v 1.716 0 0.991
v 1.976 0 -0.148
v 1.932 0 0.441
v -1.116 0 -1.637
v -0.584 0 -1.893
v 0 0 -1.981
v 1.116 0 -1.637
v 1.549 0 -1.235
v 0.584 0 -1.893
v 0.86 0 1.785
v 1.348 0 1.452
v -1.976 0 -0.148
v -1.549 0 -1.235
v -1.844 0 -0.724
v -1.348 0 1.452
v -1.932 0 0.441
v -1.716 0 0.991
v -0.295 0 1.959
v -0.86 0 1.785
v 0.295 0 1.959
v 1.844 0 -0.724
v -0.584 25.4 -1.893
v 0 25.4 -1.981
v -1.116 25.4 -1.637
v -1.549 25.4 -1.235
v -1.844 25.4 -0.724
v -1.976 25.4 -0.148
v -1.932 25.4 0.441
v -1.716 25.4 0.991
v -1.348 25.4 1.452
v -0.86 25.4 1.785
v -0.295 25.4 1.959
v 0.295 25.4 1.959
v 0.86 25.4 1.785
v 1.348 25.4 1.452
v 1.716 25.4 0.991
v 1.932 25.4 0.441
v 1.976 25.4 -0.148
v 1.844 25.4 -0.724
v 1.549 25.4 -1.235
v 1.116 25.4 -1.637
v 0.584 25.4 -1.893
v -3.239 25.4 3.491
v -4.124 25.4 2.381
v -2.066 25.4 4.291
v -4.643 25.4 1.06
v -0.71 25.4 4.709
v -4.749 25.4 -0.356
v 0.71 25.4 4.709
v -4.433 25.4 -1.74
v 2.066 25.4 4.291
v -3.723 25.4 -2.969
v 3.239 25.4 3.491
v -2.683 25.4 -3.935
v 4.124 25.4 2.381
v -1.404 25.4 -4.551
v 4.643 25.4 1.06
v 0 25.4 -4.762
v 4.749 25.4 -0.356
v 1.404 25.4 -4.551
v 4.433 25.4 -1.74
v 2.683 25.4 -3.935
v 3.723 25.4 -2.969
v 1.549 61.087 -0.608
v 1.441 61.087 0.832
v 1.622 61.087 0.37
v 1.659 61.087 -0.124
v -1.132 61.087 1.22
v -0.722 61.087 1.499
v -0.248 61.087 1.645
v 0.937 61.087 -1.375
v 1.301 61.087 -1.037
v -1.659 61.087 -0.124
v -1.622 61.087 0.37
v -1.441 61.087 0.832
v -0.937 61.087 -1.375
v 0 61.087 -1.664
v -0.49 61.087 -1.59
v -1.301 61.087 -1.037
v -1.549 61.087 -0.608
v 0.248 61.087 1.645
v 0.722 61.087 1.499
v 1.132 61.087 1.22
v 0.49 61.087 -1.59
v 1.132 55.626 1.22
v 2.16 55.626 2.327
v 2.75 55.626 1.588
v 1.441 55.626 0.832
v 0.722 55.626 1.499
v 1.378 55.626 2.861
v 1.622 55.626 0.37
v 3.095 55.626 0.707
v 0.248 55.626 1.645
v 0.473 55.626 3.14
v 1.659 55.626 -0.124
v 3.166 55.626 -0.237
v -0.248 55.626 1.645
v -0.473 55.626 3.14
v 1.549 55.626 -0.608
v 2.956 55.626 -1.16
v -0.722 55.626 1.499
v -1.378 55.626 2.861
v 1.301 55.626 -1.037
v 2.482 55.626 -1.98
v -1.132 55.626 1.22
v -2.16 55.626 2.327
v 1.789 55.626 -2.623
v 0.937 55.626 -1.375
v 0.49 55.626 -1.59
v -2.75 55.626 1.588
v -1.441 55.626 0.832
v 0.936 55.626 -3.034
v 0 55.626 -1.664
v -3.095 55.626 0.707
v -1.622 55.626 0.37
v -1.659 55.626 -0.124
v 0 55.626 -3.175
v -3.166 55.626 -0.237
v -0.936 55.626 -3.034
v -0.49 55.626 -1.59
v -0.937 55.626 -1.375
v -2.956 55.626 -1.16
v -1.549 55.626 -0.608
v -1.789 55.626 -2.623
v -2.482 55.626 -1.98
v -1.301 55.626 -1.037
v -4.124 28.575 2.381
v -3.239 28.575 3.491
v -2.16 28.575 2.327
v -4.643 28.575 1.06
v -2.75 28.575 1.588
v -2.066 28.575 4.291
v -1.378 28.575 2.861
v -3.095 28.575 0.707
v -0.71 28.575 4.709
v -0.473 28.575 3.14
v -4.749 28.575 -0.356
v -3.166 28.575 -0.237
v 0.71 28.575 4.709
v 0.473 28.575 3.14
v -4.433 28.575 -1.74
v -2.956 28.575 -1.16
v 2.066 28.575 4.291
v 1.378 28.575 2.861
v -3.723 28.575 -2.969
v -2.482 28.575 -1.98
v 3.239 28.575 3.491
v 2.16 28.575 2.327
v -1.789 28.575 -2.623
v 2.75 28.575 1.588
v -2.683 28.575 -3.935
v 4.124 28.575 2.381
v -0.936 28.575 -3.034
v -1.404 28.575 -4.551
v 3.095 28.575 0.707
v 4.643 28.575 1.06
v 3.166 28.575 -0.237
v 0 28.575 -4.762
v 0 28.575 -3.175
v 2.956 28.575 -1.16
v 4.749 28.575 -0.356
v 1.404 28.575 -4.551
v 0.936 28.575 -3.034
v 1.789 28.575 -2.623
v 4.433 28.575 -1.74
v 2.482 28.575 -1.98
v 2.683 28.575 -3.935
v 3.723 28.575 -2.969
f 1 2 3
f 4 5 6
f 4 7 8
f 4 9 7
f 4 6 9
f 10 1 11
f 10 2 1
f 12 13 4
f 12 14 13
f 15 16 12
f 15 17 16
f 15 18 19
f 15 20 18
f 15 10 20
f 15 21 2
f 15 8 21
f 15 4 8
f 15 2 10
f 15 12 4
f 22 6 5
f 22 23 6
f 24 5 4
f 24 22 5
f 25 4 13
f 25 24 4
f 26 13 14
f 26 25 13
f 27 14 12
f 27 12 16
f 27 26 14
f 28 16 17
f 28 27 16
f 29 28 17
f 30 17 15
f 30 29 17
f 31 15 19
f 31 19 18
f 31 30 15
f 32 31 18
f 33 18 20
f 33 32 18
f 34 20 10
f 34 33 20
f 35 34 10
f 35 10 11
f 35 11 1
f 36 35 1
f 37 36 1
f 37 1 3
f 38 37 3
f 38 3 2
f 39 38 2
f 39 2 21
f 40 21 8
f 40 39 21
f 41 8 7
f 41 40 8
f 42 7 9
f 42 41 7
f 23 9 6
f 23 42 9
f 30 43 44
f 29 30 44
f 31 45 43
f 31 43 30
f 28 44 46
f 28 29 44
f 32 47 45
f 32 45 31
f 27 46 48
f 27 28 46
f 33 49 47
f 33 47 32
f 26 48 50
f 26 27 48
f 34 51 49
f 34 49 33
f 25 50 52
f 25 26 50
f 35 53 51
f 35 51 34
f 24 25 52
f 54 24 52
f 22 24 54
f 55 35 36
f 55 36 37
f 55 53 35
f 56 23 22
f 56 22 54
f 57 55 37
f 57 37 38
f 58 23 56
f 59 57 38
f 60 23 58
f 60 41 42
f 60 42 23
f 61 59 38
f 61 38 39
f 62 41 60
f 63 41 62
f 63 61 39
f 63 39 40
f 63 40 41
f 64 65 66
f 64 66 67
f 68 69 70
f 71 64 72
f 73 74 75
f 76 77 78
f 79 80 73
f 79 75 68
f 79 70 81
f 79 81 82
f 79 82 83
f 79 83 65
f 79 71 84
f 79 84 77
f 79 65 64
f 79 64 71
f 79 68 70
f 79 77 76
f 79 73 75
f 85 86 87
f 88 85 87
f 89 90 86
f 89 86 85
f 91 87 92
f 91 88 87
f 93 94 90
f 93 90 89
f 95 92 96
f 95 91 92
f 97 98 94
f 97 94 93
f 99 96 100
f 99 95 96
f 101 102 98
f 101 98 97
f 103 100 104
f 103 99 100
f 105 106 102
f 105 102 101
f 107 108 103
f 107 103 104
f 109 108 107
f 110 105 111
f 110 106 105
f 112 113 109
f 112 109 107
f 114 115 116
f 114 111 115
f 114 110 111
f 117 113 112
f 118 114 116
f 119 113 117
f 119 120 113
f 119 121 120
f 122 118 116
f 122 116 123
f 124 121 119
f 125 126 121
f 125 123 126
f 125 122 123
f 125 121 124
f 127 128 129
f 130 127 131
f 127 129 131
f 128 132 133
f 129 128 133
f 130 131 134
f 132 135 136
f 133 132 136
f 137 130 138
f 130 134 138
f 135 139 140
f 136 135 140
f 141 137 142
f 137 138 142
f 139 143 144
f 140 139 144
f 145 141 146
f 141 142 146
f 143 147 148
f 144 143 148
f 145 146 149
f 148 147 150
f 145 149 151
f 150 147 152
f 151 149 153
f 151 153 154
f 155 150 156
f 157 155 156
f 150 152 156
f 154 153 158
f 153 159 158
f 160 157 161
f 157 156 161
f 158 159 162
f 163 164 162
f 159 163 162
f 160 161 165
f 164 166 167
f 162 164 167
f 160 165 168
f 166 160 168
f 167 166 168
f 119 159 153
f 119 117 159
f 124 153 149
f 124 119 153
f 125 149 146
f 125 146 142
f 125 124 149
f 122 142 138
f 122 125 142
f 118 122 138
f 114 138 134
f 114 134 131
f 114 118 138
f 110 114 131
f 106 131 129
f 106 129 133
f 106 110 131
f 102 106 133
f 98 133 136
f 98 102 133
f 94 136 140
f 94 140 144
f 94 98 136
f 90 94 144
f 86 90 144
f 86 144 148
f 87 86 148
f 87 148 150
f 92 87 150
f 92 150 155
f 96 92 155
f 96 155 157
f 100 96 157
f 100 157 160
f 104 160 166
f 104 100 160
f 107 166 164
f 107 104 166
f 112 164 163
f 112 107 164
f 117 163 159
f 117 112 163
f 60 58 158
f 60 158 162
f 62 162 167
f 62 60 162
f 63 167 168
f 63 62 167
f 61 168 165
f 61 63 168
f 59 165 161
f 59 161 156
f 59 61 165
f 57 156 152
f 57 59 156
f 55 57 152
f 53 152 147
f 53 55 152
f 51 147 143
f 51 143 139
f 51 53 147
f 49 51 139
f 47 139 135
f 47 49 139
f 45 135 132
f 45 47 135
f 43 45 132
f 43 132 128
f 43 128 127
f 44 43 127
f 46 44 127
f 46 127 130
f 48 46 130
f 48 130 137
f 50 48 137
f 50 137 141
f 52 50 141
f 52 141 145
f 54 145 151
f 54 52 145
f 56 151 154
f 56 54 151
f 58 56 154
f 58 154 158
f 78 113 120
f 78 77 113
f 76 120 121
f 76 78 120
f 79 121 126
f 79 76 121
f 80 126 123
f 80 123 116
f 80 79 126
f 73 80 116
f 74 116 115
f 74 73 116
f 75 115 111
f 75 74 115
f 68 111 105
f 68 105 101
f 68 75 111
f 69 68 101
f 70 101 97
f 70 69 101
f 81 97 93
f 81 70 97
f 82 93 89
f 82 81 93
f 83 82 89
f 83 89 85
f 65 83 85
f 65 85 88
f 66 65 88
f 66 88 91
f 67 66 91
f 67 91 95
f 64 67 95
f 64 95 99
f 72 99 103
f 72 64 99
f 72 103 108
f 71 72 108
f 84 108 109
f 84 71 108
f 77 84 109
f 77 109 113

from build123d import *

# Parameters (mm, degrees)
SKETCH2_R           = 4.7625
BOSS_EXTRUDE1_DEPTH = 3.175


with BuildPart() as part:
    # Sketch1 → Revolve1 (revolve)
    with BuildSketch(Plane.XY, mode=Mode.PRIVATE) as revolve1_sk:
        Polygon((0, 0), (1.9812, 0), (1.9812, 25.4), (3.175, 25.4), (3.175, 55.626), (1.6637, 55.626), (1.6637, 61.087), (0, 61.087), align=None)
    revolve(revolve1_sk.sketch.rotate(Axis((0, 0, 0), (0, 1, 0)), 90), axis=Axis((0, 0, 0), (0, 1, 0)))  # turned: the seam where the file's is

    # Sketch2 → Boss-Extrude1 (add)
    with BuildSketch(Plane.XZ.offset(-25.4)):
        with Locations(Location((0, 0, 0), (0, 0, 270))):  # turned: the seam where the file's is
            Circle(SKETCH2_R)
    extrude(amount=-BOSS_EXTRUDE1_DEPTH)


solid = part.part
